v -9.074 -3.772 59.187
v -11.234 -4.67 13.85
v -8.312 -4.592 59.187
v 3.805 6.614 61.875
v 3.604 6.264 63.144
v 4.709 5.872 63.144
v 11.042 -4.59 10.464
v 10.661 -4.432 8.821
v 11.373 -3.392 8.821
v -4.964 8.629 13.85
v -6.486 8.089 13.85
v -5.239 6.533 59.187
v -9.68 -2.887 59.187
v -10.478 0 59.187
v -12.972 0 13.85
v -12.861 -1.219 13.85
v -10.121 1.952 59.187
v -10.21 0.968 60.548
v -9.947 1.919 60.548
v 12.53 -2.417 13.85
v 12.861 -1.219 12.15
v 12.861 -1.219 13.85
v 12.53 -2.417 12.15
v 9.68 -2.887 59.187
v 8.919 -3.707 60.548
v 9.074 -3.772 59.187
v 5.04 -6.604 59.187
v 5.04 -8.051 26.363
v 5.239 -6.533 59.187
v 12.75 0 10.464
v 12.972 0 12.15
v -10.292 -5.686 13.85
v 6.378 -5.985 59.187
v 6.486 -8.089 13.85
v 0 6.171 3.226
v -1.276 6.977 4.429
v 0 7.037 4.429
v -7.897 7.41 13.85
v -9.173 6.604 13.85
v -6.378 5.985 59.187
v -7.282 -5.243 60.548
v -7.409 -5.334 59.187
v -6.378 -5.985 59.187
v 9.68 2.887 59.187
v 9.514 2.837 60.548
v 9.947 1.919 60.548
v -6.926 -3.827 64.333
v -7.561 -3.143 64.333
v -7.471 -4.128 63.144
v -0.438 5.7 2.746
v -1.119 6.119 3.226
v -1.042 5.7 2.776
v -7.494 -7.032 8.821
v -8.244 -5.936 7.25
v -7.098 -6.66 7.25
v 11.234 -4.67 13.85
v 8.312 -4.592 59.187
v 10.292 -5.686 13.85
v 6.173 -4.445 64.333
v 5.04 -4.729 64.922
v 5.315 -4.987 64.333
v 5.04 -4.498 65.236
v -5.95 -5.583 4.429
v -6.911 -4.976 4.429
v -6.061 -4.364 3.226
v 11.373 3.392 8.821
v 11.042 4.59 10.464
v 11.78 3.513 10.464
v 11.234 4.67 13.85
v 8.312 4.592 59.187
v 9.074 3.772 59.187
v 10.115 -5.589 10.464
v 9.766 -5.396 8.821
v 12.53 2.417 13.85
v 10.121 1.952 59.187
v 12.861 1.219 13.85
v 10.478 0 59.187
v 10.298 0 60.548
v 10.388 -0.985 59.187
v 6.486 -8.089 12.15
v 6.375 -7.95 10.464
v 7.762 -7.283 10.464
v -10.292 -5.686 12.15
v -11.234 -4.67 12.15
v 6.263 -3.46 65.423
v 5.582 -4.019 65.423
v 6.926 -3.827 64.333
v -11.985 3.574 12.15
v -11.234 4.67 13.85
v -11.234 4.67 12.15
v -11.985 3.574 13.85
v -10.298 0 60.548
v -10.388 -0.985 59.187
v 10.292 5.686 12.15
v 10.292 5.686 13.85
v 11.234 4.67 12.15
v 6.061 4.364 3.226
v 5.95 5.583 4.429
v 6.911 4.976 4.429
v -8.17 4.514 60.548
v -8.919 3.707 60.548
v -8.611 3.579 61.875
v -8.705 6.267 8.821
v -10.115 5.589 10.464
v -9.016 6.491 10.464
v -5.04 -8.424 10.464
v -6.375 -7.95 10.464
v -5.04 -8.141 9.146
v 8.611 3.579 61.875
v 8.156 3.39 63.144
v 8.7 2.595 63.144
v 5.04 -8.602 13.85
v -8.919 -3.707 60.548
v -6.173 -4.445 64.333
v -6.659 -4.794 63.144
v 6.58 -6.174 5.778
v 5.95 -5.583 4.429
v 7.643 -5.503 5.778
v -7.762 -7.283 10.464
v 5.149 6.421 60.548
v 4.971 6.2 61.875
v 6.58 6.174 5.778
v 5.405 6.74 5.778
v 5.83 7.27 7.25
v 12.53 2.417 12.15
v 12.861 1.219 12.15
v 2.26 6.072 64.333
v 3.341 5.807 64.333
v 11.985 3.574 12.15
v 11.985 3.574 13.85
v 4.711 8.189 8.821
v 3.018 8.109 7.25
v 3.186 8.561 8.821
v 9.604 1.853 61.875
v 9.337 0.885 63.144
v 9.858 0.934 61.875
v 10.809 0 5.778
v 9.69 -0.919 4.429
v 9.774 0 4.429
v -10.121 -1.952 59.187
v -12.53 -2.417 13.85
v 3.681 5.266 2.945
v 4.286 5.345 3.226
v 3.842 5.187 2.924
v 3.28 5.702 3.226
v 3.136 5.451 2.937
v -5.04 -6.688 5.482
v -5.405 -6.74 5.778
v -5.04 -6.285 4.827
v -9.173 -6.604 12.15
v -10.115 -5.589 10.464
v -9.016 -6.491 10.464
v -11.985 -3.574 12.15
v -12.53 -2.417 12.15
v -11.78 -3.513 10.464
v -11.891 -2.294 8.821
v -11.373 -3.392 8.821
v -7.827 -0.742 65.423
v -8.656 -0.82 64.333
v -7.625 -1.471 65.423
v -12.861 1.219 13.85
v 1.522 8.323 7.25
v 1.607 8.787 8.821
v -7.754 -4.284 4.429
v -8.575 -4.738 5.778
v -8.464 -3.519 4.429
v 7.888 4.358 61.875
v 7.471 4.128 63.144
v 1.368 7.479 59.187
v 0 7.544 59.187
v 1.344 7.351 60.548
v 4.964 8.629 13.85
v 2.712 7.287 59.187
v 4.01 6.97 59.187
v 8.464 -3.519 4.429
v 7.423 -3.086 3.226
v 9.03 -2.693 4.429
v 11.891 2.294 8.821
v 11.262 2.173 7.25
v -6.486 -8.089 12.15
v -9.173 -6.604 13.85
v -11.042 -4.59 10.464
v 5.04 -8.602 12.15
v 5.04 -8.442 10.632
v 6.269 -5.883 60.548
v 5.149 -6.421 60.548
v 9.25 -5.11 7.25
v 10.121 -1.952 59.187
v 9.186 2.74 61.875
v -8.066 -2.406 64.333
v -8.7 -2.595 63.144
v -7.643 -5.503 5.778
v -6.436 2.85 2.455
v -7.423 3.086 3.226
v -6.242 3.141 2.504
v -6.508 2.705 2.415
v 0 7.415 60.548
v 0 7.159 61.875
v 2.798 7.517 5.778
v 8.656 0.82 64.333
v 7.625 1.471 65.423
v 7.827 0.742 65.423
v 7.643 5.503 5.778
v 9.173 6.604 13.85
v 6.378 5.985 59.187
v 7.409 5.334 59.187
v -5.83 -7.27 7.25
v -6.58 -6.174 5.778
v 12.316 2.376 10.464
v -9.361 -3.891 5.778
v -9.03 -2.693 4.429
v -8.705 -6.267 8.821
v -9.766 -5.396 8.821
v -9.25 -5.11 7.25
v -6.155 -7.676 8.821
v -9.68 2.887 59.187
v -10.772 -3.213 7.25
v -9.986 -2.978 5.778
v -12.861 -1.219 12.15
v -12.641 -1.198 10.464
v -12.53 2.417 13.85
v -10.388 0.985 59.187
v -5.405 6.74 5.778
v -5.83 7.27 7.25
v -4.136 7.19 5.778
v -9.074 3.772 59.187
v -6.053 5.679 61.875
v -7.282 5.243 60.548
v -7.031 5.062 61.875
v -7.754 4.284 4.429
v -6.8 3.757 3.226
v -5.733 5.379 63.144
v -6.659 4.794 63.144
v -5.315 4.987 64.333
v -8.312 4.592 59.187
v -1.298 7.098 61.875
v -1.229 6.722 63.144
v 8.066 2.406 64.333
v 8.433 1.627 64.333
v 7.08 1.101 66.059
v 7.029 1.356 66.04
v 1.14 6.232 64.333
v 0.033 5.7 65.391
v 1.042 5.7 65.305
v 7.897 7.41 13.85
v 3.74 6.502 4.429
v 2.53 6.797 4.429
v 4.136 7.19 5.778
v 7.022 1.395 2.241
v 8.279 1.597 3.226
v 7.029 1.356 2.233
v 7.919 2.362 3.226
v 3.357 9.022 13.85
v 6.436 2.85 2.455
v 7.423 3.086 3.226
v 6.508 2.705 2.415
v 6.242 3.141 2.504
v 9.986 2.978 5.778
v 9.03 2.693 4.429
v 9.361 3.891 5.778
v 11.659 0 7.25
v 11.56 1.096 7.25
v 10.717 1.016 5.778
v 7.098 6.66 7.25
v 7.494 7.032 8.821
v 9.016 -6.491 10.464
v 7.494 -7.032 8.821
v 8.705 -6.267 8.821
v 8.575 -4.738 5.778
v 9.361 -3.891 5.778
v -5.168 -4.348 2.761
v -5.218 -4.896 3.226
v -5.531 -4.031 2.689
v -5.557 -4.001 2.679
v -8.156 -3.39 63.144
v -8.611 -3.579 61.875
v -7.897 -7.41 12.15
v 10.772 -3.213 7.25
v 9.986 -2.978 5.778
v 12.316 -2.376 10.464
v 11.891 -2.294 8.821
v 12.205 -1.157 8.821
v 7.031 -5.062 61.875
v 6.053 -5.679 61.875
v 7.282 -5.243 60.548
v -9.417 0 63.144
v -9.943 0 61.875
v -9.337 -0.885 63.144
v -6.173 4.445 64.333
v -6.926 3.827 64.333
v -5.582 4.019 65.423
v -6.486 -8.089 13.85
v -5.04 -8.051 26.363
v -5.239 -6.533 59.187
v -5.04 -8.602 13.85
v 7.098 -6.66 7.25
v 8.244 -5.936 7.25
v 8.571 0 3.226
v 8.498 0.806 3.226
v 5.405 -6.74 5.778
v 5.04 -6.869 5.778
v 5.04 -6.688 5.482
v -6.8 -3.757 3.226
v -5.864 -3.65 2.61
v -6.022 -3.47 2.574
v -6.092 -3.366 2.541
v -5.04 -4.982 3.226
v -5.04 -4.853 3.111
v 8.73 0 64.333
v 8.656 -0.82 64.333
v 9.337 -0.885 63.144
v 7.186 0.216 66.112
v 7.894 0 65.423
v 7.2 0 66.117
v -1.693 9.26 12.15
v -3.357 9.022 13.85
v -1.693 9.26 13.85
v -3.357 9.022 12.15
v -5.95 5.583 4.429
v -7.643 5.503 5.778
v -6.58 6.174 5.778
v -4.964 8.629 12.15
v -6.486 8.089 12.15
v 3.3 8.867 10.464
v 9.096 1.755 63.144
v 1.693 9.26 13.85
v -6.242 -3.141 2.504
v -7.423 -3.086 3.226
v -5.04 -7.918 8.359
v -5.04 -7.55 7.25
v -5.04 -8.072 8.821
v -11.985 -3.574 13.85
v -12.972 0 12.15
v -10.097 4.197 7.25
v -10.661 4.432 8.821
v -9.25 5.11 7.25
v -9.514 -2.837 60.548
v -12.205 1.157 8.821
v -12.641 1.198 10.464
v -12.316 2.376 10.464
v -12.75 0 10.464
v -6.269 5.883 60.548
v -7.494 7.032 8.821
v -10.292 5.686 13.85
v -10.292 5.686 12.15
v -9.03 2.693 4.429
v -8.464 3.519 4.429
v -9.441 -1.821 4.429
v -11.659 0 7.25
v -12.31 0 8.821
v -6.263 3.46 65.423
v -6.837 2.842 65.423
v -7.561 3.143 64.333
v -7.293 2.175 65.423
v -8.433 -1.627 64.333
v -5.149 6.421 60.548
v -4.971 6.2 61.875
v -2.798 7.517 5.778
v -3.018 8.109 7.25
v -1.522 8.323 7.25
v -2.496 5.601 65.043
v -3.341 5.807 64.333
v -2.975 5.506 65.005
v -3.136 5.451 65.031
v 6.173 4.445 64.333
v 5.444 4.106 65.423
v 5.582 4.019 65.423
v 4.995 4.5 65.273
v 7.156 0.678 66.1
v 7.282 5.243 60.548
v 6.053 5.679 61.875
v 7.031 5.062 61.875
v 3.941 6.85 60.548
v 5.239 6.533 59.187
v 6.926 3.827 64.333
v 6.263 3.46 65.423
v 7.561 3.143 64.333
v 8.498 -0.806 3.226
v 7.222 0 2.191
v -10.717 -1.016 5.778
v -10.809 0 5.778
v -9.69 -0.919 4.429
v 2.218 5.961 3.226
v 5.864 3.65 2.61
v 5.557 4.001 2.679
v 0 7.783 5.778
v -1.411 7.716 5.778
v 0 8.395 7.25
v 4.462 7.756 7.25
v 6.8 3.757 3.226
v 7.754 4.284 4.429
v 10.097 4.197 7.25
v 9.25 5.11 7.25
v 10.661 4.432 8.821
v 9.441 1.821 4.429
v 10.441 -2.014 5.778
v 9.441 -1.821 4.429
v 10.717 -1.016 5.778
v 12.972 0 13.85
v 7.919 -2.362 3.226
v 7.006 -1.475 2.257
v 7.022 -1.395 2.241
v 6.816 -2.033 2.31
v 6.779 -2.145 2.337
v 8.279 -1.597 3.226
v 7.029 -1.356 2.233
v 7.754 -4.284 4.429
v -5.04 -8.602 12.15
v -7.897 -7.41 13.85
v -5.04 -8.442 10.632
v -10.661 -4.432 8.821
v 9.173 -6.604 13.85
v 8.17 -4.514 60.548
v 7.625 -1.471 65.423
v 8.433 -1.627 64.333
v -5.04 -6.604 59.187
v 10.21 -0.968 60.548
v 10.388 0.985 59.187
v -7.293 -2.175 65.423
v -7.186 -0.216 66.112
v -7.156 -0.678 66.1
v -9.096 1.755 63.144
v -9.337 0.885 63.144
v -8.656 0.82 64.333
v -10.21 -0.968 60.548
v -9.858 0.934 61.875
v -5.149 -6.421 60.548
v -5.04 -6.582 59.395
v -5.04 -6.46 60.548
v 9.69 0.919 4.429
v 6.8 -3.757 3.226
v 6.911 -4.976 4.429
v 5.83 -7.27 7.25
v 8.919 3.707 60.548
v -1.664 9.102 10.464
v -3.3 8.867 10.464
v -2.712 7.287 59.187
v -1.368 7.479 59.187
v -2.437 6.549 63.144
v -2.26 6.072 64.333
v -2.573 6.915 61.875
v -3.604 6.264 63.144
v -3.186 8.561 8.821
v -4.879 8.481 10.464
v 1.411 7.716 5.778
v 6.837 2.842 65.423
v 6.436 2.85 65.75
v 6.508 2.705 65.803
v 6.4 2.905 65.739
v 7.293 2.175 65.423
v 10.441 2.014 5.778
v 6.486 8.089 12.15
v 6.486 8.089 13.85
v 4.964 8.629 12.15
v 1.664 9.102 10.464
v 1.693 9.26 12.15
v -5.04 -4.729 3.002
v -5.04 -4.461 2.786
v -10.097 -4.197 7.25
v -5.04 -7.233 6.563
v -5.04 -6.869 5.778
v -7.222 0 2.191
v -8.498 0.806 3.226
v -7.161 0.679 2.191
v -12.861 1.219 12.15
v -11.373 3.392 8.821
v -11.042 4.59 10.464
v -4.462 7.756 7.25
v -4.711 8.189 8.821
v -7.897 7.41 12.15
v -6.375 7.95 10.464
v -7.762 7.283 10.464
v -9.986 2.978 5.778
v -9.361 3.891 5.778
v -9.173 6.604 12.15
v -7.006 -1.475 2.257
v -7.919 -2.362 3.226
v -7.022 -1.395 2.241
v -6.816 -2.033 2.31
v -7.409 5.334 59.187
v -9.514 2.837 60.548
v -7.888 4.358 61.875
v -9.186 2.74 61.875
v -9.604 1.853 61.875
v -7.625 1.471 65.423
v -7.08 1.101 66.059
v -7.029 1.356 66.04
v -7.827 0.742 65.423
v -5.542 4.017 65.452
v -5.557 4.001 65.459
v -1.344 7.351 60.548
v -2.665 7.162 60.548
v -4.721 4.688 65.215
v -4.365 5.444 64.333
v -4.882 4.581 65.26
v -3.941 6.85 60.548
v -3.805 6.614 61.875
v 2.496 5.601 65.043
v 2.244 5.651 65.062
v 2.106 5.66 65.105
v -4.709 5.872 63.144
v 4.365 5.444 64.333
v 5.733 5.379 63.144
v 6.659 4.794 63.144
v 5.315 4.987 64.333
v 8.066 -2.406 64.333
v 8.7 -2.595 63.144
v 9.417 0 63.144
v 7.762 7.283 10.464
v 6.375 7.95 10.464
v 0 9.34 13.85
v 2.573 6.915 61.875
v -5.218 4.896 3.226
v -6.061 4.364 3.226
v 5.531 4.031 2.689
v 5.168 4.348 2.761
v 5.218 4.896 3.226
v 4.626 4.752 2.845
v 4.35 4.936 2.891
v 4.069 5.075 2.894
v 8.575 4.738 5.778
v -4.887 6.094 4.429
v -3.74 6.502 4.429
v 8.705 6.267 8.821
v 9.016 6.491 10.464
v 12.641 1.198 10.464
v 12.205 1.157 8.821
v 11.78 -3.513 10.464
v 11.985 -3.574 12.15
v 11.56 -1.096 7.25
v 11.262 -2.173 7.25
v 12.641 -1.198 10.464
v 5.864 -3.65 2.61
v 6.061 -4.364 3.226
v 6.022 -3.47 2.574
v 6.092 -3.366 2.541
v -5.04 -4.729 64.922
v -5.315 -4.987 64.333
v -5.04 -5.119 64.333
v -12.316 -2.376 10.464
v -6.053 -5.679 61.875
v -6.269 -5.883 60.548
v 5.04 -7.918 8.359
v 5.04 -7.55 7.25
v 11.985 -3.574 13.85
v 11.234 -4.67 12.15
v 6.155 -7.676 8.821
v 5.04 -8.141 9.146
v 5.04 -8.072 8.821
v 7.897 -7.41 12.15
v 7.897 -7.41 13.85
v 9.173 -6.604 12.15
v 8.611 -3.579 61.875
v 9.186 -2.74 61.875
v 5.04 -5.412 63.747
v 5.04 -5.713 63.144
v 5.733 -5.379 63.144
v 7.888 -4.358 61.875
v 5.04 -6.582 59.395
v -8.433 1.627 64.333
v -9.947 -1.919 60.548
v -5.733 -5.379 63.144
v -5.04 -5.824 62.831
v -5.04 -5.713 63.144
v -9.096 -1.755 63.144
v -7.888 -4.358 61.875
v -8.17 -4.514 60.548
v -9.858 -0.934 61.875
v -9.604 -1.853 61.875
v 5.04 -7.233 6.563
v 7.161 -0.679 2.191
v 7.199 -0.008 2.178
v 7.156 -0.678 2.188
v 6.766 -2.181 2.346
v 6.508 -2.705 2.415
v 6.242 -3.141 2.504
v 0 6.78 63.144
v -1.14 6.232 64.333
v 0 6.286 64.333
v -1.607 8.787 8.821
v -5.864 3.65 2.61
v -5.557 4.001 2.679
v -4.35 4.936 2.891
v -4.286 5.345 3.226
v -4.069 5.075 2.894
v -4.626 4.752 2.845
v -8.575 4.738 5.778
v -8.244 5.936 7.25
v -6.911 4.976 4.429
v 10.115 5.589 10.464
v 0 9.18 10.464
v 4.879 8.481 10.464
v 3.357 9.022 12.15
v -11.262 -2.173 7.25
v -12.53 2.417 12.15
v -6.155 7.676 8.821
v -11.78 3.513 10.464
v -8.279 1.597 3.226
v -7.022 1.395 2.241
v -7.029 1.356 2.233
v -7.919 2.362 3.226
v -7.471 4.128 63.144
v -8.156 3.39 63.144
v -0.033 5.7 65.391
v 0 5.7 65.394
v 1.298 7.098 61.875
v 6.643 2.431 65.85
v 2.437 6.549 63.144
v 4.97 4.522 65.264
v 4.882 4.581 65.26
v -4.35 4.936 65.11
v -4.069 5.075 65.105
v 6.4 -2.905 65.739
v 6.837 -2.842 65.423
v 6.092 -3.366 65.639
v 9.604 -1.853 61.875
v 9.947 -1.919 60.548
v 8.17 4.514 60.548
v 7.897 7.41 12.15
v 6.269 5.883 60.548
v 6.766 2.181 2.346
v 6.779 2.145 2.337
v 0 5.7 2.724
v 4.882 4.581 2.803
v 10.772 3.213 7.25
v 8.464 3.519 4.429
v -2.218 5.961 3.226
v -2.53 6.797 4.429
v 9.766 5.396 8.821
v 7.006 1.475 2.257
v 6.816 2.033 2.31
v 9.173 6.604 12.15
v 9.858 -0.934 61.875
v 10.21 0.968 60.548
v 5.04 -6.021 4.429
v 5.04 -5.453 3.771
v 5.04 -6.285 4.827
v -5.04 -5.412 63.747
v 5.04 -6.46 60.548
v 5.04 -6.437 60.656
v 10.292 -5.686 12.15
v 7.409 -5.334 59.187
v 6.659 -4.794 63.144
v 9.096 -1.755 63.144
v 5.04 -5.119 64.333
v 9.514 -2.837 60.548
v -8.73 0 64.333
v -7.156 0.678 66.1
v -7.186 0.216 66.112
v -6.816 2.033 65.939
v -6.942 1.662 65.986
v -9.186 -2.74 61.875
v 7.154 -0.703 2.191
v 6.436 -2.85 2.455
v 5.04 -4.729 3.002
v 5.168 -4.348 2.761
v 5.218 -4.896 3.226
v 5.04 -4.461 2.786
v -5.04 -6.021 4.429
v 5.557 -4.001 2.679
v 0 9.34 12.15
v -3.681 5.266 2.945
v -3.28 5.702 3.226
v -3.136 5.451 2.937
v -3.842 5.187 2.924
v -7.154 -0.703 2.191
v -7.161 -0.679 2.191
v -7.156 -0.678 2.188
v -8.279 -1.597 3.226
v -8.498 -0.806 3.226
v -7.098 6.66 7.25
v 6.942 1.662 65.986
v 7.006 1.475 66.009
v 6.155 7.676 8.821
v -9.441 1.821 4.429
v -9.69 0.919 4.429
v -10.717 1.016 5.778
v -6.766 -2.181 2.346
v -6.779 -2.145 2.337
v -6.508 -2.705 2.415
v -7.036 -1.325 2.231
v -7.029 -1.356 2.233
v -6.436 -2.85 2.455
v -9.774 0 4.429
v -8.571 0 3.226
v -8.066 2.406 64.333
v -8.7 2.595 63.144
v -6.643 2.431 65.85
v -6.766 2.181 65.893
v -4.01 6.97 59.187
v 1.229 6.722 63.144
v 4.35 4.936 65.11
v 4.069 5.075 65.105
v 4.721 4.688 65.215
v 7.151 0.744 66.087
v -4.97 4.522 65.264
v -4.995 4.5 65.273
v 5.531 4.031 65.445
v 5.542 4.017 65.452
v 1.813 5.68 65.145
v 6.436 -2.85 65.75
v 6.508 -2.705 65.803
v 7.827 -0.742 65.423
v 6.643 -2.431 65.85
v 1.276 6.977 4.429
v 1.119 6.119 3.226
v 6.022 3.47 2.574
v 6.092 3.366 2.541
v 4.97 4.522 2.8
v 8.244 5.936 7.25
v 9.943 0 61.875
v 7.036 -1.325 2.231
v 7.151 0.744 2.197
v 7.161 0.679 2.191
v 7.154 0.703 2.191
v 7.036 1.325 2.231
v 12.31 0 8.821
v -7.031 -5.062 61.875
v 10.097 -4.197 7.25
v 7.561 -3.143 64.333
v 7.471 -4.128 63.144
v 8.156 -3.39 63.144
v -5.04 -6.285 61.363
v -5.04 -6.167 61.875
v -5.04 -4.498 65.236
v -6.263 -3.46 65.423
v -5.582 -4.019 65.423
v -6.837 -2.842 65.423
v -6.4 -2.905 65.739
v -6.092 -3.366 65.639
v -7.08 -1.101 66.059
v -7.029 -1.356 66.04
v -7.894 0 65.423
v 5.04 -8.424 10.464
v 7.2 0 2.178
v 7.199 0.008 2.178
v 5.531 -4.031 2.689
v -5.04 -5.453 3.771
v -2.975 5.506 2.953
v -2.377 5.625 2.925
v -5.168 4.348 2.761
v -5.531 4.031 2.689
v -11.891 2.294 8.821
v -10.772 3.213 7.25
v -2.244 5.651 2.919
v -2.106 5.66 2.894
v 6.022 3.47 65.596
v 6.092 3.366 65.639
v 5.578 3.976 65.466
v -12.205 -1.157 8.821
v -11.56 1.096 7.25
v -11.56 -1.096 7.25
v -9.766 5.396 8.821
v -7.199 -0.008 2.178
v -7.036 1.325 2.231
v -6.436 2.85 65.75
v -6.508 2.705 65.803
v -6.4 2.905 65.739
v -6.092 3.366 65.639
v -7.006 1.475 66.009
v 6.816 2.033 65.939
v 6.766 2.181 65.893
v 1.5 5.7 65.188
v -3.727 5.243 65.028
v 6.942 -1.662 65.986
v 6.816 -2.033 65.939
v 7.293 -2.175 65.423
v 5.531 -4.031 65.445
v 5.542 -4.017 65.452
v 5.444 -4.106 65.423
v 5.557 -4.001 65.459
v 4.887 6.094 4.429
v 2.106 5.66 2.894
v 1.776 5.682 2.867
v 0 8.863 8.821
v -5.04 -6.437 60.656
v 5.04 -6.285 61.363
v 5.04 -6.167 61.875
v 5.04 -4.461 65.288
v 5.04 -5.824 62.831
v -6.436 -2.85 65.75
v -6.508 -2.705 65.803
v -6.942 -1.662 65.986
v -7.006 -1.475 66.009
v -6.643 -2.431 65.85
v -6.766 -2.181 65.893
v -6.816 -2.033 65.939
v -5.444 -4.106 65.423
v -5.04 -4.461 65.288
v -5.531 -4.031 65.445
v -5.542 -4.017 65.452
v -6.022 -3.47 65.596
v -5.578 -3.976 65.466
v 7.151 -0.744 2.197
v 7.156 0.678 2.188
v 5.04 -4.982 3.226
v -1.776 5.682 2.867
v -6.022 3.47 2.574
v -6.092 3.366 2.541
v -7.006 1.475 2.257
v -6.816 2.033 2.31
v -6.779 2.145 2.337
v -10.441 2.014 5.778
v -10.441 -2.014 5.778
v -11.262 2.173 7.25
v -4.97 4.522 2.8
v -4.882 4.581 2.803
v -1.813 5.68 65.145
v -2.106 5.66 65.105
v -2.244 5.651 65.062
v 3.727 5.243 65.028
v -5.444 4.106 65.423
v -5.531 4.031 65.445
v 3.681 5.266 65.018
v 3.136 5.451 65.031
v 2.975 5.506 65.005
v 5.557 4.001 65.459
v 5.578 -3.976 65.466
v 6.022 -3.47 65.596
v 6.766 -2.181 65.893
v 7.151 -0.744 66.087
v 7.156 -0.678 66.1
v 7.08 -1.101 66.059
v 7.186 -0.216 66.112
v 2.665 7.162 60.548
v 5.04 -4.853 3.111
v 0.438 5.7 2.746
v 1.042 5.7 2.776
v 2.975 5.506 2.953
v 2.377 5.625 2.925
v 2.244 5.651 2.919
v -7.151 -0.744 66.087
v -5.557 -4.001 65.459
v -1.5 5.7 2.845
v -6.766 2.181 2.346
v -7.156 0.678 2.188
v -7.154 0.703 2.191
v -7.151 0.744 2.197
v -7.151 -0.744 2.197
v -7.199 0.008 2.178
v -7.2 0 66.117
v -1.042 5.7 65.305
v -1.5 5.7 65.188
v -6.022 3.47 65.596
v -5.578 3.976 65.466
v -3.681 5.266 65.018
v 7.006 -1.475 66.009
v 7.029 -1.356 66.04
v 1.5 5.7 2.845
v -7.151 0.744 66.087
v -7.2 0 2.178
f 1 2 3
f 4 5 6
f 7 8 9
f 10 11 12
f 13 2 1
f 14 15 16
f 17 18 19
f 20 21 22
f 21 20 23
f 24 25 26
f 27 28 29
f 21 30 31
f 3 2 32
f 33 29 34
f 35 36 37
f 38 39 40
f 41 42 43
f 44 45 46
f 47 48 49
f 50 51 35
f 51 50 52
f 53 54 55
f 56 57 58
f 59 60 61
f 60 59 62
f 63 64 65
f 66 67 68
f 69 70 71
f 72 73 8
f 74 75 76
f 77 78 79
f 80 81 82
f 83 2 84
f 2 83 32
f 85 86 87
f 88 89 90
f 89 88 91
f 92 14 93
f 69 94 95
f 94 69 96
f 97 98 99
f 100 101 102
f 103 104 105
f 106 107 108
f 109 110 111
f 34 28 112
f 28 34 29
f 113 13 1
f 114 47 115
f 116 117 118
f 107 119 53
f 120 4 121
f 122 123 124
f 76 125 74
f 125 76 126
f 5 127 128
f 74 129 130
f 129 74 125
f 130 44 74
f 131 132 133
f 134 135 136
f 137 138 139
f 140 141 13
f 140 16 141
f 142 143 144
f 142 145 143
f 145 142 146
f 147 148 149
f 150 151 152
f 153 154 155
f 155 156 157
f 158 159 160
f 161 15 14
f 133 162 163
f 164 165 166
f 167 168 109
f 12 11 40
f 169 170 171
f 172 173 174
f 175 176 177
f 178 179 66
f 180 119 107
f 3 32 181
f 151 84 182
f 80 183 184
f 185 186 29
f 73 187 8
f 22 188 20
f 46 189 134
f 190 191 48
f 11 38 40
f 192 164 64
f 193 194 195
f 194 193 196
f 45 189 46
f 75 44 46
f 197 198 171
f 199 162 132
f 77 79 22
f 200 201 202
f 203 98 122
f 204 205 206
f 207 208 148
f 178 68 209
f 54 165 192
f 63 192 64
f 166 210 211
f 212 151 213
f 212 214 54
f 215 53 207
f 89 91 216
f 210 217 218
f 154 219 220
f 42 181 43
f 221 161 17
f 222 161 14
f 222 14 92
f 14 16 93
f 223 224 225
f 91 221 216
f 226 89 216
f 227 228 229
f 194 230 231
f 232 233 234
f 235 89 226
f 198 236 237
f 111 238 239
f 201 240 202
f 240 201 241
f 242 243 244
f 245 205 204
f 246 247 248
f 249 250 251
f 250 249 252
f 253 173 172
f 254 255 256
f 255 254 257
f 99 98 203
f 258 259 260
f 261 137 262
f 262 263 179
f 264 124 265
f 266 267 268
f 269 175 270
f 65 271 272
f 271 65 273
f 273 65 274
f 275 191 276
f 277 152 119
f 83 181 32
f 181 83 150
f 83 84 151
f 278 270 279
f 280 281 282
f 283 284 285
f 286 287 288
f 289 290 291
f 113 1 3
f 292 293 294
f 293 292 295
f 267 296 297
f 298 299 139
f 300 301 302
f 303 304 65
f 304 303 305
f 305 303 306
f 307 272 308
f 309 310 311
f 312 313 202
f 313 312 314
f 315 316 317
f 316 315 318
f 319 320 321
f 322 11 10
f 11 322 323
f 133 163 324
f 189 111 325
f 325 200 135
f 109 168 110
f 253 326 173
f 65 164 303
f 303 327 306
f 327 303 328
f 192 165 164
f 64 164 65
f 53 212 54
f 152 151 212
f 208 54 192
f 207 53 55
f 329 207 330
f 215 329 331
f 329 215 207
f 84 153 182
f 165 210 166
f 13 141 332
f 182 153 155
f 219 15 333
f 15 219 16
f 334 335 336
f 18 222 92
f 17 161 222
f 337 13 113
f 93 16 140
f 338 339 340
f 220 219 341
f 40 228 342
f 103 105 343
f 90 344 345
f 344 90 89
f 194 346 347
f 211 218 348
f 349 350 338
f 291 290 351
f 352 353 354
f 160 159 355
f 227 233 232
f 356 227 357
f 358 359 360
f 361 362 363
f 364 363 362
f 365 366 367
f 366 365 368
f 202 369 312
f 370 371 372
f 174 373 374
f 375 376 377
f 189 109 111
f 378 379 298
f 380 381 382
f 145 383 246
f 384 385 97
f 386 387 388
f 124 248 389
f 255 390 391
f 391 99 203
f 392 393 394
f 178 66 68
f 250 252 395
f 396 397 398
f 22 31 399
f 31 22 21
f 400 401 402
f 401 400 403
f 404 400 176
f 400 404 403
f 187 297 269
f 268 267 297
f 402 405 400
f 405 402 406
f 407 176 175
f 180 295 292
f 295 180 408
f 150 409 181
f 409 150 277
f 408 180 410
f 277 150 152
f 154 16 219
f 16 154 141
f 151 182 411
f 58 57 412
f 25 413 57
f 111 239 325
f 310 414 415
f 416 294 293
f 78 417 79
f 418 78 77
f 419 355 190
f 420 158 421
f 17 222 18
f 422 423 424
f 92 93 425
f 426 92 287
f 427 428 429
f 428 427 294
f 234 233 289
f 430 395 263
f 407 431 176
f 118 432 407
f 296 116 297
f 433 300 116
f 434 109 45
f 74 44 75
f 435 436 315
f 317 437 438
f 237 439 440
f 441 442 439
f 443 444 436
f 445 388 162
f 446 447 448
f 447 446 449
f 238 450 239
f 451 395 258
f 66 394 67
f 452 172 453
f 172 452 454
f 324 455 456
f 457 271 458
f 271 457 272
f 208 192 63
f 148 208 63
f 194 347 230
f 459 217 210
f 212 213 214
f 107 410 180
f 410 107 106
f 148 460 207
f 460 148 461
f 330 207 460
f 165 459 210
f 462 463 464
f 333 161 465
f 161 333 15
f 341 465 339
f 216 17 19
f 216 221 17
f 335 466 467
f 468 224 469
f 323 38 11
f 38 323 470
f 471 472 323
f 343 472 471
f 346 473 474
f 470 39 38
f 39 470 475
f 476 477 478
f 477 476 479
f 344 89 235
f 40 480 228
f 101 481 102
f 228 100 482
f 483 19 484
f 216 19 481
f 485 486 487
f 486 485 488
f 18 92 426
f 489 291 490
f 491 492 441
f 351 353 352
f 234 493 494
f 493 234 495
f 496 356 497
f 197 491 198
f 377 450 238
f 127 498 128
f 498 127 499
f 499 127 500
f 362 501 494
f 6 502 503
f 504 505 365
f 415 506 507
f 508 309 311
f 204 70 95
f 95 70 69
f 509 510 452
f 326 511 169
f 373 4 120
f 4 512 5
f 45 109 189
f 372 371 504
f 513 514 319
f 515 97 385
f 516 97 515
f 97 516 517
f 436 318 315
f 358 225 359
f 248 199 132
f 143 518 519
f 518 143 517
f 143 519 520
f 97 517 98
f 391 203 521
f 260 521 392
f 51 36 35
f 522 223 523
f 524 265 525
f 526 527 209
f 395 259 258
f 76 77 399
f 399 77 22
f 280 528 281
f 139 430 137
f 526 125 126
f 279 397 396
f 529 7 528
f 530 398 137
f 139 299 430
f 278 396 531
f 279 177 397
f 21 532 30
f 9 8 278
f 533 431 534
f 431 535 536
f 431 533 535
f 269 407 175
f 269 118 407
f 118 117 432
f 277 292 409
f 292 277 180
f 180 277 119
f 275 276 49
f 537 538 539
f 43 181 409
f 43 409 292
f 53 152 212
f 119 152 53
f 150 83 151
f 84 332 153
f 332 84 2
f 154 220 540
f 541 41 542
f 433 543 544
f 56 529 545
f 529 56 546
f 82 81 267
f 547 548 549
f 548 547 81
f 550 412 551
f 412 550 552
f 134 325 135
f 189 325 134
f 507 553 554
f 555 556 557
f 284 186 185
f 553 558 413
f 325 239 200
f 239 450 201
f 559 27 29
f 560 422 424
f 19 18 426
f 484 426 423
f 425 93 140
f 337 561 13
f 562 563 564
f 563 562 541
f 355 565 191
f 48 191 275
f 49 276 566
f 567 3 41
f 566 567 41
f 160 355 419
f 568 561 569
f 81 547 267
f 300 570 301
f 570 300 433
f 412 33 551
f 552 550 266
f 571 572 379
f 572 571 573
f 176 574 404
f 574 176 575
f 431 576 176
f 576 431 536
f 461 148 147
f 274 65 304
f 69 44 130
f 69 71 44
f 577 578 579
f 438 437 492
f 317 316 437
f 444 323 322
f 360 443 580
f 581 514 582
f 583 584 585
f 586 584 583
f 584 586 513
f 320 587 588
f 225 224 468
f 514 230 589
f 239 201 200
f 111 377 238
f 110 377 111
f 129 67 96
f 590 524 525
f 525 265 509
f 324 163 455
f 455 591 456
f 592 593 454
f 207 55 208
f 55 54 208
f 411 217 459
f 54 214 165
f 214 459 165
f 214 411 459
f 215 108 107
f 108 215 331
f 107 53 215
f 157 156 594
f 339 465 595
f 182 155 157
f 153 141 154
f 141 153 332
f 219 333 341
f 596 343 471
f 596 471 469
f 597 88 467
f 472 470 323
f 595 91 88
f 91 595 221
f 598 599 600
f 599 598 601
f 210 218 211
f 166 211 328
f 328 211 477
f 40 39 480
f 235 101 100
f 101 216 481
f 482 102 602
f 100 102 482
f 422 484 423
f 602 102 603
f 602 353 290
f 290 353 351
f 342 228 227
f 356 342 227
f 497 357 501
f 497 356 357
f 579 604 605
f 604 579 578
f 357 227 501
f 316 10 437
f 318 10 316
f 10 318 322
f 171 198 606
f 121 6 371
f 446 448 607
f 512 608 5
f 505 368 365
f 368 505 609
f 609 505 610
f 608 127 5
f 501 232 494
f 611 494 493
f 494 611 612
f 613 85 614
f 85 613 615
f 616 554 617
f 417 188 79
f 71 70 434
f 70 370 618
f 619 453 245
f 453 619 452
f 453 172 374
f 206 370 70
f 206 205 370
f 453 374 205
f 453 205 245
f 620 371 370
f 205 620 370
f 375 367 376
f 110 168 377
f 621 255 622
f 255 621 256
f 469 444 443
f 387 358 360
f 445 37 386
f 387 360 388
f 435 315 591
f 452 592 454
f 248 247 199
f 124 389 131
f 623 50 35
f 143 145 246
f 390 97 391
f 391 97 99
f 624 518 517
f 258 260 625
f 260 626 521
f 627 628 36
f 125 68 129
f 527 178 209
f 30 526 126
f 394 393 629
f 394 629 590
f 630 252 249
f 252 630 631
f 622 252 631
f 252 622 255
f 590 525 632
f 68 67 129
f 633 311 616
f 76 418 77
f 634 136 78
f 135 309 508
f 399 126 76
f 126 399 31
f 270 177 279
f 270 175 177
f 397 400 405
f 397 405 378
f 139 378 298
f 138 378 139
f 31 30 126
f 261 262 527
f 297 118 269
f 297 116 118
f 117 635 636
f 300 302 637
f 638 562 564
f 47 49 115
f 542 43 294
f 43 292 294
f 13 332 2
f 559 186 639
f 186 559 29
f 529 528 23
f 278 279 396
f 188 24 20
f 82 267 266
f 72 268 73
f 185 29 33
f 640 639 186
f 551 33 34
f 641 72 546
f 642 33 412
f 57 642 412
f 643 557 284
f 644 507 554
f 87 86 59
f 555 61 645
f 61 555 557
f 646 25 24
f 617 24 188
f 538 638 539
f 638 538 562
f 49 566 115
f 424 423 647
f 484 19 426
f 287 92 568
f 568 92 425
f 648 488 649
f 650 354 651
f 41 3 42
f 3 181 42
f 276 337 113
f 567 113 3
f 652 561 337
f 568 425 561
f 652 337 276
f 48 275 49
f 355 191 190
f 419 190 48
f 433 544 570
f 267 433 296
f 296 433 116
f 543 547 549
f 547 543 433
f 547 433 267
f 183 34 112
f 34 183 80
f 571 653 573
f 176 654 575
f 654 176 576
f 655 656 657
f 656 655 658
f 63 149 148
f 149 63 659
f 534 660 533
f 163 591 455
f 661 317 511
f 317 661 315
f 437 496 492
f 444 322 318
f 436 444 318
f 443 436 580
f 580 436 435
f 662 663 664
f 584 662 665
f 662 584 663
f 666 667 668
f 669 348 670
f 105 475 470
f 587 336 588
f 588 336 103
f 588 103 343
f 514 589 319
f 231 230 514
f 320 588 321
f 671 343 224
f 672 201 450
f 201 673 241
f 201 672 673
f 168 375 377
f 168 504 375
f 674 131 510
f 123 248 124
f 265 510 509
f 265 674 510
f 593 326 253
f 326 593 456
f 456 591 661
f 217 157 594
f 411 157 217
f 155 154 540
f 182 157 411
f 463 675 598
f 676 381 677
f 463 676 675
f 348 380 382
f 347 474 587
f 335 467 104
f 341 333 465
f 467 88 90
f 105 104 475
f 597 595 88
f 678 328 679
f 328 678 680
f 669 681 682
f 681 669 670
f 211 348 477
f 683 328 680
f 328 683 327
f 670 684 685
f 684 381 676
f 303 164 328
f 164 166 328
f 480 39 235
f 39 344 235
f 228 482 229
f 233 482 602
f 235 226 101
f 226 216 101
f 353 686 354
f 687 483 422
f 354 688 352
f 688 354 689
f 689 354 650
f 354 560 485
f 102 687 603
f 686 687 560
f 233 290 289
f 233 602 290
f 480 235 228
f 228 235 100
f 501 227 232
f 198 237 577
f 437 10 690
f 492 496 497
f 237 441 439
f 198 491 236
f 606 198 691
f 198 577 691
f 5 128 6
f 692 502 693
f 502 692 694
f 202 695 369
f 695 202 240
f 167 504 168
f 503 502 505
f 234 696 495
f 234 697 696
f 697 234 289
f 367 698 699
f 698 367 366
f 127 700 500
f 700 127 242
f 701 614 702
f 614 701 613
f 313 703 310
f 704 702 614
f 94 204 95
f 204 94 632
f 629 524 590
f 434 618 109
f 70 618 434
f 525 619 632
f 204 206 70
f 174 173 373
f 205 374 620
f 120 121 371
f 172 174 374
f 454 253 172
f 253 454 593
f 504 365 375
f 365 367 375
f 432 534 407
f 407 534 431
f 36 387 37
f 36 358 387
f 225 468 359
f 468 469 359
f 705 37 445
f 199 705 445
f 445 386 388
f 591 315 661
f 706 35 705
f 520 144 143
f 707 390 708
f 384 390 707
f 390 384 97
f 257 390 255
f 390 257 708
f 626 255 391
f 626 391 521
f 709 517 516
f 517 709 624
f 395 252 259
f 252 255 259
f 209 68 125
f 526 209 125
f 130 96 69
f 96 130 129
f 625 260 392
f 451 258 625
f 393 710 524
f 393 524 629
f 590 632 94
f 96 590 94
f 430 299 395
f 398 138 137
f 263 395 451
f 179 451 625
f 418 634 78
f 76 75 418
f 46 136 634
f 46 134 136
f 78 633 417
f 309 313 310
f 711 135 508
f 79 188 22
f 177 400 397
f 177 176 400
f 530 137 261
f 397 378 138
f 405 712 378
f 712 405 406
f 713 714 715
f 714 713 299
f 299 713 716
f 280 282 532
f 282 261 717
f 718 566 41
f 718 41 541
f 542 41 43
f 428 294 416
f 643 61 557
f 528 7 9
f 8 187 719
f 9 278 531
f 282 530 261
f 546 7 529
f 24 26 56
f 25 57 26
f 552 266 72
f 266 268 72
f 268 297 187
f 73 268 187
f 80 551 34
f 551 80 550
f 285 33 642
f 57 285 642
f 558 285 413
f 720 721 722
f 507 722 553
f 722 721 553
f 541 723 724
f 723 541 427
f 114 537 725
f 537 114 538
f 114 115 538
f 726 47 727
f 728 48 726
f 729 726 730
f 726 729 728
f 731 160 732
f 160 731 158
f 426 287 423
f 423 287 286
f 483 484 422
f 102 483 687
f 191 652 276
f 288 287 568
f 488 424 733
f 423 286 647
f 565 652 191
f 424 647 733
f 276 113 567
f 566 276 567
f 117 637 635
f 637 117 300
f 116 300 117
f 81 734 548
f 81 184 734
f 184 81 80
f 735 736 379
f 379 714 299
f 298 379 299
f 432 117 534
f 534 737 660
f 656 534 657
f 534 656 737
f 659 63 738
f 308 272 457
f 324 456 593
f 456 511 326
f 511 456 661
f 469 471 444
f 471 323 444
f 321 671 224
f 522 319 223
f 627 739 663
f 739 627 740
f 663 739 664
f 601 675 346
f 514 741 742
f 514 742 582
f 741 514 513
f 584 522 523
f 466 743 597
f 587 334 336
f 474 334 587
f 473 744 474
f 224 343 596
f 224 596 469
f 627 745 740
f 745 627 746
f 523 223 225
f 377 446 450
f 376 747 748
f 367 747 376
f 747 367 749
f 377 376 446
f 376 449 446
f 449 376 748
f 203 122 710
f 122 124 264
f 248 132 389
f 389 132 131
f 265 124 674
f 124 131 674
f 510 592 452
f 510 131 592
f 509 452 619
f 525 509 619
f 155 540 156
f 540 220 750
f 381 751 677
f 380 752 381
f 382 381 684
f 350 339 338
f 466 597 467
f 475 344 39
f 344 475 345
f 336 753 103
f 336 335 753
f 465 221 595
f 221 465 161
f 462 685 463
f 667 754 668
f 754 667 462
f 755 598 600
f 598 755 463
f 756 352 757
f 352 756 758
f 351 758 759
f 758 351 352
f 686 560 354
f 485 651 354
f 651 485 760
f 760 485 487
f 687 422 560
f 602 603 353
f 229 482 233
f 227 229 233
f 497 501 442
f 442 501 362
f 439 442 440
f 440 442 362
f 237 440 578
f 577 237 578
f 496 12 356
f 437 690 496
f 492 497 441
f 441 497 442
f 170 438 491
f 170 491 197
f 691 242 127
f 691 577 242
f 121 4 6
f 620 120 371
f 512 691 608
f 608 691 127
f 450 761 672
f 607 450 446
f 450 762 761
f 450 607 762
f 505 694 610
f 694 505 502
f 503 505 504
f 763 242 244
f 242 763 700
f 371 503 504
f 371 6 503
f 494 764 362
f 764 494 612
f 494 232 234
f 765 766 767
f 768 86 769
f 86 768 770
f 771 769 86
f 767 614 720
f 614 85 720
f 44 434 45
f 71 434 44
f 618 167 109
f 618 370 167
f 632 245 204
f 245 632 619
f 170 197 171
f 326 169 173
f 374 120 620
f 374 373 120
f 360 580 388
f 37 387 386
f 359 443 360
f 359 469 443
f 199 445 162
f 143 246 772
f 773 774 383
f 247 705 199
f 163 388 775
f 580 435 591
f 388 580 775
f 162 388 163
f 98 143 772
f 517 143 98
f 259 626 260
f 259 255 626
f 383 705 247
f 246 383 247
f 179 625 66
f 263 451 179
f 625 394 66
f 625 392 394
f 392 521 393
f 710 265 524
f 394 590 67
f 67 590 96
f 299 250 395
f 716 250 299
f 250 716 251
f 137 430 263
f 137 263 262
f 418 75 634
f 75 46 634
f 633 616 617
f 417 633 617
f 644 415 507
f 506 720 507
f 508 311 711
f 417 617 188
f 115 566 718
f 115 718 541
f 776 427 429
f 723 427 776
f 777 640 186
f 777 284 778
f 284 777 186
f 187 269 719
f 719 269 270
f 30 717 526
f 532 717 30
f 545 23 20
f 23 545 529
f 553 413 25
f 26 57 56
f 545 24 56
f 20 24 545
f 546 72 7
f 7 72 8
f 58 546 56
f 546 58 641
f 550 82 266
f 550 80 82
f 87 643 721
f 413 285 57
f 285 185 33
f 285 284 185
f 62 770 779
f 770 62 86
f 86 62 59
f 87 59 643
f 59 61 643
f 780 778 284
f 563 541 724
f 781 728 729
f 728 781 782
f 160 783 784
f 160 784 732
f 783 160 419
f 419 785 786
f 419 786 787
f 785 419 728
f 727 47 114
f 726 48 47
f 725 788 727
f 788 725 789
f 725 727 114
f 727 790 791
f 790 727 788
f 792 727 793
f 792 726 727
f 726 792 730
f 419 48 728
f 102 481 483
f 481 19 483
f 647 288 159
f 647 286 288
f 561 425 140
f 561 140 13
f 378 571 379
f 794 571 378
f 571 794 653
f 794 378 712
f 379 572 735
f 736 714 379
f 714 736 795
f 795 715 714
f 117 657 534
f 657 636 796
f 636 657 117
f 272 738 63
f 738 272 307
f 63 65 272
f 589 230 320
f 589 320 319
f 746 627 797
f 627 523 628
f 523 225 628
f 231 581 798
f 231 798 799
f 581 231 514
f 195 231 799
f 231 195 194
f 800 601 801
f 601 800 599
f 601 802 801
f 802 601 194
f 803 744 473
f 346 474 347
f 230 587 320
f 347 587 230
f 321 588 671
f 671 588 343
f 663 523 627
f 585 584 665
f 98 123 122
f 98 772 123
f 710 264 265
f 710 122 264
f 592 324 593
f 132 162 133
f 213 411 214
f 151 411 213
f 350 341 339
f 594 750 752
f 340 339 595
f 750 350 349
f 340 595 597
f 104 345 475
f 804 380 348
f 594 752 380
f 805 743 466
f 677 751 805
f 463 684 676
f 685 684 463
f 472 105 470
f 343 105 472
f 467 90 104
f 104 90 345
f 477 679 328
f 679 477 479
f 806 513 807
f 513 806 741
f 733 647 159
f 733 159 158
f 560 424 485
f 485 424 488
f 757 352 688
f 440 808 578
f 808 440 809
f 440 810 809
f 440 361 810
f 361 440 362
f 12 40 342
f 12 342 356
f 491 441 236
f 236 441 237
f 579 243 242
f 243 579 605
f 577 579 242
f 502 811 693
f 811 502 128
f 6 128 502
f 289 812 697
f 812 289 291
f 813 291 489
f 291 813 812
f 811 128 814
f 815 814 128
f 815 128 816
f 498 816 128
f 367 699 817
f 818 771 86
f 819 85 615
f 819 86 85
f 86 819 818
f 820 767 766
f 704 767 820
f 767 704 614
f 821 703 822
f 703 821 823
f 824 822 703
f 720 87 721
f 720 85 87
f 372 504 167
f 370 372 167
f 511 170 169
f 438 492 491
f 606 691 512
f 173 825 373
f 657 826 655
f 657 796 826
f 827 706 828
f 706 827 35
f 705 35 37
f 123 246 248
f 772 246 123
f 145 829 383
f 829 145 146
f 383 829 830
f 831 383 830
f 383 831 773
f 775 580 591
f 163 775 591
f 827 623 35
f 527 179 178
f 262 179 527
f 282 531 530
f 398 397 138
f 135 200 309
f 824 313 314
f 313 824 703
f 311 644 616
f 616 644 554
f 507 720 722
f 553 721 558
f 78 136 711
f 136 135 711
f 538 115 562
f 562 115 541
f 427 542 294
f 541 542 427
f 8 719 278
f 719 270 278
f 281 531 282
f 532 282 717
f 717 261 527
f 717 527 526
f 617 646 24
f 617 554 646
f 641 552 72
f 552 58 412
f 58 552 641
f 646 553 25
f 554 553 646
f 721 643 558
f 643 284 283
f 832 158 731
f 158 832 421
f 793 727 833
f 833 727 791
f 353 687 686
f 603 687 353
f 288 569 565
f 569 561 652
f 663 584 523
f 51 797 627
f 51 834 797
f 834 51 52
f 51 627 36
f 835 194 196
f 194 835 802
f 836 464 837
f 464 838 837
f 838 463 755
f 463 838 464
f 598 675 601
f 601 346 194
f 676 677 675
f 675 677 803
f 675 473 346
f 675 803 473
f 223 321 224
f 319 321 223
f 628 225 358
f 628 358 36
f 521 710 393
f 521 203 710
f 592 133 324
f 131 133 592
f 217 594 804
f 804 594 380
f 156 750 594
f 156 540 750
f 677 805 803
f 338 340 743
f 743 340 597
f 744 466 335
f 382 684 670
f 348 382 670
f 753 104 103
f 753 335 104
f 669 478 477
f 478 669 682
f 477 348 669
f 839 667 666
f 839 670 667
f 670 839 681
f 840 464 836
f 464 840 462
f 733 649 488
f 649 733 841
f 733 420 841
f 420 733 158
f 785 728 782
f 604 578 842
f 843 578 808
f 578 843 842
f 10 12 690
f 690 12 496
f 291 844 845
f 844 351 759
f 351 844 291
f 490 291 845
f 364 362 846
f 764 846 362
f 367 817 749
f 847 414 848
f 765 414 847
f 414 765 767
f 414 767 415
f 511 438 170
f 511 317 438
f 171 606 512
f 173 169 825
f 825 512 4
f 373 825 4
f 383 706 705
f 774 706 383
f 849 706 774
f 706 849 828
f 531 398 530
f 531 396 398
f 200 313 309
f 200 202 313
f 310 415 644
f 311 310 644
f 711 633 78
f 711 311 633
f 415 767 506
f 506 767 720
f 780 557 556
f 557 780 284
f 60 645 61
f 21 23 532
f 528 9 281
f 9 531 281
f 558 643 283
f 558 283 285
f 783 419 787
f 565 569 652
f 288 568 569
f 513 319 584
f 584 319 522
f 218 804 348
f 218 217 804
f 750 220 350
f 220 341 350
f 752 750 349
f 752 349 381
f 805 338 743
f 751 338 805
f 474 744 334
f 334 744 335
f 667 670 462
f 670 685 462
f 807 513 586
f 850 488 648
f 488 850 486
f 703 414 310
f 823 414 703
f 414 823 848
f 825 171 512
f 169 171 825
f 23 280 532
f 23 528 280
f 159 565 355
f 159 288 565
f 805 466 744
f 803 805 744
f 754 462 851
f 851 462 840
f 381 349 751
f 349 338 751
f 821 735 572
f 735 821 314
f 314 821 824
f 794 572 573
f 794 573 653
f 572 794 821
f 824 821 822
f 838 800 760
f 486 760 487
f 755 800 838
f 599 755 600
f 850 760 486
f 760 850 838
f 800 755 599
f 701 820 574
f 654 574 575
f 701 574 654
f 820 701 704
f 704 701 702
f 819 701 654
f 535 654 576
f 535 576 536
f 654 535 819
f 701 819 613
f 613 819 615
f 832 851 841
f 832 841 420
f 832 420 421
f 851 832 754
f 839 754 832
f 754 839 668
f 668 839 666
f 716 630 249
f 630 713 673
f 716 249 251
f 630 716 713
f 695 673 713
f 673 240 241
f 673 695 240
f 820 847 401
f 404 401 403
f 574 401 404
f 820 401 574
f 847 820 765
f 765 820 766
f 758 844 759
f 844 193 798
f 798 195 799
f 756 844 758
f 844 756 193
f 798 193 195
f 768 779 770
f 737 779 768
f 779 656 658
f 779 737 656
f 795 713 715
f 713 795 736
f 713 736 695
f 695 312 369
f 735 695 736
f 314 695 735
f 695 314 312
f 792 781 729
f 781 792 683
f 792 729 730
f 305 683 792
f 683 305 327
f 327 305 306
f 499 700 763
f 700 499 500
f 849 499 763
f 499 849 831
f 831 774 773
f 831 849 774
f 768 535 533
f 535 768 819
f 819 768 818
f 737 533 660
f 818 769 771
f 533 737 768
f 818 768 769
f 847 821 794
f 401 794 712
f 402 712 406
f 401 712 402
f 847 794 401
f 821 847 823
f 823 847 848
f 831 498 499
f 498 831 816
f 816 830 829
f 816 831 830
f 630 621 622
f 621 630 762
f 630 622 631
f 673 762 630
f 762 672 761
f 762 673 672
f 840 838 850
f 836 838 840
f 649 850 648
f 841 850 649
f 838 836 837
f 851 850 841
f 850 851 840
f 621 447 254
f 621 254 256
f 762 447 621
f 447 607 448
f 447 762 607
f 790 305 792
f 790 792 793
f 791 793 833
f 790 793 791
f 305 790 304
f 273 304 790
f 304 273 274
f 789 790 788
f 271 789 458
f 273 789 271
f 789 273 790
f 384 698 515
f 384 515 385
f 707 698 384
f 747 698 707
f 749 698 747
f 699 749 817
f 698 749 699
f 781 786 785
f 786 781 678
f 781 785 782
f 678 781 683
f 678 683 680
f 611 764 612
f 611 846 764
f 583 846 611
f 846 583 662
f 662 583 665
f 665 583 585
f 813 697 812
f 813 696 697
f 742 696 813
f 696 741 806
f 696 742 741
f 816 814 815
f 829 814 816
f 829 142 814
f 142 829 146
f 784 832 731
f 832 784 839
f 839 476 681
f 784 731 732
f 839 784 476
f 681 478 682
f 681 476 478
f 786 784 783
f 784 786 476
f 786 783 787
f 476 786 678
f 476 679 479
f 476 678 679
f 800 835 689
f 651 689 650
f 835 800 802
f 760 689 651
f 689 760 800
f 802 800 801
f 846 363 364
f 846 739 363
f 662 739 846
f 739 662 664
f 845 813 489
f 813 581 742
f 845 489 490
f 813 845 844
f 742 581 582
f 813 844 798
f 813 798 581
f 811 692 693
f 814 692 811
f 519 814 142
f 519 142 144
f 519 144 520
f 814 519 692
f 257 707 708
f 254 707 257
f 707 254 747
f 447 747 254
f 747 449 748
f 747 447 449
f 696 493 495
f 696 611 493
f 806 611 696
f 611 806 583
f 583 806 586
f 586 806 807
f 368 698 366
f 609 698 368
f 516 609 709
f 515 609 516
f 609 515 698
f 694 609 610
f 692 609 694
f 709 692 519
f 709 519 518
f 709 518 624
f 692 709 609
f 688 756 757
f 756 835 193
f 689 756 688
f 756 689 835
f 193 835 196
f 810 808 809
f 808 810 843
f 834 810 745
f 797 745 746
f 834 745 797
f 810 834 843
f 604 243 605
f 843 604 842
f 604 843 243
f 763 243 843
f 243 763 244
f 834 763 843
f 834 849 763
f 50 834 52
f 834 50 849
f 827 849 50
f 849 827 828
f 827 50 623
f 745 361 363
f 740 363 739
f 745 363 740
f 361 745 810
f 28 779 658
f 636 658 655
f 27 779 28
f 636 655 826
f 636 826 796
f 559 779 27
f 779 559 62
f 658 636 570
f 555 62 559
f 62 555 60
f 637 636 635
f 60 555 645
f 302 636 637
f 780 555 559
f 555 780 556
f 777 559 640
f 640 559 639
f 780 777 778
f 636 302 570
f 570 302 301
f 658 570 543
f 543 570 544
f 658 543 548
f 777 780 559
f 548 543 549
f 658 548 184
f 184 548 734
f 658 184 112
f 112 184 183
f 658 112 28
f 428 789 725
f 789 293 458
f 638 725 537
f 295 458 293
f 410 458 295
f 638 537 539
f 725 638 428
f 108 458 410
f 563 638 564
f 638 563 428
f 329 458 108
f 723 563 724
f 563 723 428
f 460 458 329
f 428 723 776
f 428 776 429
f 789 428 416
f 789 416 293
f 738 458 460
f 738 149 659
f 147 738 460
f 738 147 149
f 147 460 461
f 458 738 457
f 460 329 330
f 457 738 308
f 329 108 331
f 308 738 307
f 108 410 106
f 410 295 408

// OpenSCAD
// file: params.scad
// ==================== source of truth ====================
// Every number below is cross-referenced to either this repo's own simulation
// model (src/robot_cat_description/urdf/cat.urdf.xacro at scale 1.0, and
// robot_cat_gait/leg_ik.py) or to a measurement of a real CAD file - see
// hardware/cad/measure/README.md for the method, the sources and the raw
// numbers.
//
// Nothing here is a guess any more. The two values that used to be flagged
// ADJUSTABLE (the horn bolt circle and a downloaded bracket's flange) were
// replaced by measurements taken off the official STS3215 STEP model, so the
// downloaded bracket is no longer on the critical path at all.

// ---- leg geometry - VERIFIED, must match leg_ik.py exactly ----
thigh_length = 110;   // LegGeometry.thigh_length, axis to axis
calf_length  = 110;   // LegGeometry.calf_length, axis to paw centre
hip_offset   = 25;    // hip roll axis -> thigh pitch axis, lateral
foot_radius  = 12;    // paw pad sphere radius

// ---- trunk geometry - VERIFIED ----
hip_x = 110;          // hip mount, x from body centre (so 220mm hip-to-hip)
hip_y = 55;           // hip mount, y from body centre (so 110mm hip-to-hip)
body_length = 300;
body_width  = 111;
body_height = 141;

// ---- ST3215 / STS3215 servo - MEASURED from the official CAD model
// (TheRobotStudio/SO-ARM100, STEP/SO100/STS3215_03a.step). The shop pages'
// "45.2 x 24.7 x 35" is the CASE only; the model bounding box is 39.6 deep
// because the output boss and the idler boss stand proud of it. Pocket depth
// must use servo_h, clearance above it must allow for servo_boss. ----
servo_l = 45.4;
servo_w = 24.8;
servo_h = 35.4;        // case alone, faces at +/-17.7 from centre
servo_boss_h = 2.3;    // output boss above the case face
servo_boss_d = 22.1;   // raised collar around the output axis, +0.1 clearance
servo_axis_x = 12.5;   // output axis offset from the servo's own centre,
                       // i.e. 10.2mm in from the near end face
servo_fit = 0.4;       // FDM clearance added per side around the pocket

// ---- Raspberry Pi 5 mounting - VERIFIED against the official Raspberry Pi
// Ltd mechanical drawing (RP-008347-DS-1): 58 x 49mm hole spacing, Ø2.7mm
// holes (clearance for M2.5) ----
pi_hole_x = 58;
pi_hole_y = 49;
pi_hole_d = 2.9;       // add a touch over the datasheet 2.7 for FDM tolerance

// ---- servo horn bolt circle - MEASURED, exact
// Four holes, all on ONE circle of radius 7.000mm (diameter 14.00), at 45,
// 135, 225 and 315 degrees - a square of side 9.90mm. Least-squares circle
// fit to the STEP model's analytic CIRCLE entities, residual 0.000mm.
//
// The earlier "three holes at 6.7, one at 5.6" here was wrong. It came from
// misreading OpenRoboticDog's hip_x4.stl, which has no horn circle at all -
// those were the servo's case screws. See measure/README.md.
horn_bolt_r = 7.0;
horn_bolt_d = 2.7;         // M2.5 clearance, model bore is 2.5
horn_hub_d = 9.2;          // Ø9.0 hub on the horn face, +0.2 clearance

// ---- servo case screw positions - MEASURED
// The four screws that hold the servo case together double as mounting
// points: this is how OpenRoboticDog fixes the servo to its frame, and that
// part measures 3.75mm apart against this model's 3.8mm. Positions are given
// relative to the servo centre, on both flanks at y = +/-10.25.
case_screw_y = 10.25;
case_screw_x = [4.2, -16.5, -20.3];
case_screw_d = 2.2;        // M2 clearance; the servo's own bore is 1.5 pilot

// Two of the three are enough to fix a servo, and OpenRoboticDog uses two.
// Which two matters here: taking the pair NEAREST the output axis keeps a
// mounting pad 35mm long instead of 45mm, which is what lets the trunk frame
// stay inside the 300mm body. The outermost screw stays available if a part
// wants all three.
case_screw_x_used = [4.2, -16.5];

// ---- leg segment spines ----
// The rectangular bar between a segment's two end plates. Declared here
// because FOUR files need it and only agreement makes them fit: the segment
// itself, and the cosmetic fairing that snaps over it. A comment saying
// "must match" is not a mechanism.
thigh_spine = [14, 10];
calf_spine  = [12, 9];

// ---- print structure ----
wall = 4;             // load-bearing wall thickness in PETG
insert_d = 4.2;        // M3 brass heat-set insert bore
insert_depth = 6;
$fn = 48;
// main file
// Oslona goleni, x4. Same idea as the thigh fairing over the smaller calf
// spine. Shorter, because the paw pad takes the last stretch.
include <shell_lib.scad>

spine_w = calf_spine[0];   // params.scad, shared with the segment
spine_h = calf_spine[1];
fair_len = (calf_length) - 2 * limb_gap - housing_d / 2;

module calf_fairing() { limb_fairing(spine_w, spine_h, fair_len, limb_d_calf[0], limb_d_calf[1]); }

calf_fairing();
